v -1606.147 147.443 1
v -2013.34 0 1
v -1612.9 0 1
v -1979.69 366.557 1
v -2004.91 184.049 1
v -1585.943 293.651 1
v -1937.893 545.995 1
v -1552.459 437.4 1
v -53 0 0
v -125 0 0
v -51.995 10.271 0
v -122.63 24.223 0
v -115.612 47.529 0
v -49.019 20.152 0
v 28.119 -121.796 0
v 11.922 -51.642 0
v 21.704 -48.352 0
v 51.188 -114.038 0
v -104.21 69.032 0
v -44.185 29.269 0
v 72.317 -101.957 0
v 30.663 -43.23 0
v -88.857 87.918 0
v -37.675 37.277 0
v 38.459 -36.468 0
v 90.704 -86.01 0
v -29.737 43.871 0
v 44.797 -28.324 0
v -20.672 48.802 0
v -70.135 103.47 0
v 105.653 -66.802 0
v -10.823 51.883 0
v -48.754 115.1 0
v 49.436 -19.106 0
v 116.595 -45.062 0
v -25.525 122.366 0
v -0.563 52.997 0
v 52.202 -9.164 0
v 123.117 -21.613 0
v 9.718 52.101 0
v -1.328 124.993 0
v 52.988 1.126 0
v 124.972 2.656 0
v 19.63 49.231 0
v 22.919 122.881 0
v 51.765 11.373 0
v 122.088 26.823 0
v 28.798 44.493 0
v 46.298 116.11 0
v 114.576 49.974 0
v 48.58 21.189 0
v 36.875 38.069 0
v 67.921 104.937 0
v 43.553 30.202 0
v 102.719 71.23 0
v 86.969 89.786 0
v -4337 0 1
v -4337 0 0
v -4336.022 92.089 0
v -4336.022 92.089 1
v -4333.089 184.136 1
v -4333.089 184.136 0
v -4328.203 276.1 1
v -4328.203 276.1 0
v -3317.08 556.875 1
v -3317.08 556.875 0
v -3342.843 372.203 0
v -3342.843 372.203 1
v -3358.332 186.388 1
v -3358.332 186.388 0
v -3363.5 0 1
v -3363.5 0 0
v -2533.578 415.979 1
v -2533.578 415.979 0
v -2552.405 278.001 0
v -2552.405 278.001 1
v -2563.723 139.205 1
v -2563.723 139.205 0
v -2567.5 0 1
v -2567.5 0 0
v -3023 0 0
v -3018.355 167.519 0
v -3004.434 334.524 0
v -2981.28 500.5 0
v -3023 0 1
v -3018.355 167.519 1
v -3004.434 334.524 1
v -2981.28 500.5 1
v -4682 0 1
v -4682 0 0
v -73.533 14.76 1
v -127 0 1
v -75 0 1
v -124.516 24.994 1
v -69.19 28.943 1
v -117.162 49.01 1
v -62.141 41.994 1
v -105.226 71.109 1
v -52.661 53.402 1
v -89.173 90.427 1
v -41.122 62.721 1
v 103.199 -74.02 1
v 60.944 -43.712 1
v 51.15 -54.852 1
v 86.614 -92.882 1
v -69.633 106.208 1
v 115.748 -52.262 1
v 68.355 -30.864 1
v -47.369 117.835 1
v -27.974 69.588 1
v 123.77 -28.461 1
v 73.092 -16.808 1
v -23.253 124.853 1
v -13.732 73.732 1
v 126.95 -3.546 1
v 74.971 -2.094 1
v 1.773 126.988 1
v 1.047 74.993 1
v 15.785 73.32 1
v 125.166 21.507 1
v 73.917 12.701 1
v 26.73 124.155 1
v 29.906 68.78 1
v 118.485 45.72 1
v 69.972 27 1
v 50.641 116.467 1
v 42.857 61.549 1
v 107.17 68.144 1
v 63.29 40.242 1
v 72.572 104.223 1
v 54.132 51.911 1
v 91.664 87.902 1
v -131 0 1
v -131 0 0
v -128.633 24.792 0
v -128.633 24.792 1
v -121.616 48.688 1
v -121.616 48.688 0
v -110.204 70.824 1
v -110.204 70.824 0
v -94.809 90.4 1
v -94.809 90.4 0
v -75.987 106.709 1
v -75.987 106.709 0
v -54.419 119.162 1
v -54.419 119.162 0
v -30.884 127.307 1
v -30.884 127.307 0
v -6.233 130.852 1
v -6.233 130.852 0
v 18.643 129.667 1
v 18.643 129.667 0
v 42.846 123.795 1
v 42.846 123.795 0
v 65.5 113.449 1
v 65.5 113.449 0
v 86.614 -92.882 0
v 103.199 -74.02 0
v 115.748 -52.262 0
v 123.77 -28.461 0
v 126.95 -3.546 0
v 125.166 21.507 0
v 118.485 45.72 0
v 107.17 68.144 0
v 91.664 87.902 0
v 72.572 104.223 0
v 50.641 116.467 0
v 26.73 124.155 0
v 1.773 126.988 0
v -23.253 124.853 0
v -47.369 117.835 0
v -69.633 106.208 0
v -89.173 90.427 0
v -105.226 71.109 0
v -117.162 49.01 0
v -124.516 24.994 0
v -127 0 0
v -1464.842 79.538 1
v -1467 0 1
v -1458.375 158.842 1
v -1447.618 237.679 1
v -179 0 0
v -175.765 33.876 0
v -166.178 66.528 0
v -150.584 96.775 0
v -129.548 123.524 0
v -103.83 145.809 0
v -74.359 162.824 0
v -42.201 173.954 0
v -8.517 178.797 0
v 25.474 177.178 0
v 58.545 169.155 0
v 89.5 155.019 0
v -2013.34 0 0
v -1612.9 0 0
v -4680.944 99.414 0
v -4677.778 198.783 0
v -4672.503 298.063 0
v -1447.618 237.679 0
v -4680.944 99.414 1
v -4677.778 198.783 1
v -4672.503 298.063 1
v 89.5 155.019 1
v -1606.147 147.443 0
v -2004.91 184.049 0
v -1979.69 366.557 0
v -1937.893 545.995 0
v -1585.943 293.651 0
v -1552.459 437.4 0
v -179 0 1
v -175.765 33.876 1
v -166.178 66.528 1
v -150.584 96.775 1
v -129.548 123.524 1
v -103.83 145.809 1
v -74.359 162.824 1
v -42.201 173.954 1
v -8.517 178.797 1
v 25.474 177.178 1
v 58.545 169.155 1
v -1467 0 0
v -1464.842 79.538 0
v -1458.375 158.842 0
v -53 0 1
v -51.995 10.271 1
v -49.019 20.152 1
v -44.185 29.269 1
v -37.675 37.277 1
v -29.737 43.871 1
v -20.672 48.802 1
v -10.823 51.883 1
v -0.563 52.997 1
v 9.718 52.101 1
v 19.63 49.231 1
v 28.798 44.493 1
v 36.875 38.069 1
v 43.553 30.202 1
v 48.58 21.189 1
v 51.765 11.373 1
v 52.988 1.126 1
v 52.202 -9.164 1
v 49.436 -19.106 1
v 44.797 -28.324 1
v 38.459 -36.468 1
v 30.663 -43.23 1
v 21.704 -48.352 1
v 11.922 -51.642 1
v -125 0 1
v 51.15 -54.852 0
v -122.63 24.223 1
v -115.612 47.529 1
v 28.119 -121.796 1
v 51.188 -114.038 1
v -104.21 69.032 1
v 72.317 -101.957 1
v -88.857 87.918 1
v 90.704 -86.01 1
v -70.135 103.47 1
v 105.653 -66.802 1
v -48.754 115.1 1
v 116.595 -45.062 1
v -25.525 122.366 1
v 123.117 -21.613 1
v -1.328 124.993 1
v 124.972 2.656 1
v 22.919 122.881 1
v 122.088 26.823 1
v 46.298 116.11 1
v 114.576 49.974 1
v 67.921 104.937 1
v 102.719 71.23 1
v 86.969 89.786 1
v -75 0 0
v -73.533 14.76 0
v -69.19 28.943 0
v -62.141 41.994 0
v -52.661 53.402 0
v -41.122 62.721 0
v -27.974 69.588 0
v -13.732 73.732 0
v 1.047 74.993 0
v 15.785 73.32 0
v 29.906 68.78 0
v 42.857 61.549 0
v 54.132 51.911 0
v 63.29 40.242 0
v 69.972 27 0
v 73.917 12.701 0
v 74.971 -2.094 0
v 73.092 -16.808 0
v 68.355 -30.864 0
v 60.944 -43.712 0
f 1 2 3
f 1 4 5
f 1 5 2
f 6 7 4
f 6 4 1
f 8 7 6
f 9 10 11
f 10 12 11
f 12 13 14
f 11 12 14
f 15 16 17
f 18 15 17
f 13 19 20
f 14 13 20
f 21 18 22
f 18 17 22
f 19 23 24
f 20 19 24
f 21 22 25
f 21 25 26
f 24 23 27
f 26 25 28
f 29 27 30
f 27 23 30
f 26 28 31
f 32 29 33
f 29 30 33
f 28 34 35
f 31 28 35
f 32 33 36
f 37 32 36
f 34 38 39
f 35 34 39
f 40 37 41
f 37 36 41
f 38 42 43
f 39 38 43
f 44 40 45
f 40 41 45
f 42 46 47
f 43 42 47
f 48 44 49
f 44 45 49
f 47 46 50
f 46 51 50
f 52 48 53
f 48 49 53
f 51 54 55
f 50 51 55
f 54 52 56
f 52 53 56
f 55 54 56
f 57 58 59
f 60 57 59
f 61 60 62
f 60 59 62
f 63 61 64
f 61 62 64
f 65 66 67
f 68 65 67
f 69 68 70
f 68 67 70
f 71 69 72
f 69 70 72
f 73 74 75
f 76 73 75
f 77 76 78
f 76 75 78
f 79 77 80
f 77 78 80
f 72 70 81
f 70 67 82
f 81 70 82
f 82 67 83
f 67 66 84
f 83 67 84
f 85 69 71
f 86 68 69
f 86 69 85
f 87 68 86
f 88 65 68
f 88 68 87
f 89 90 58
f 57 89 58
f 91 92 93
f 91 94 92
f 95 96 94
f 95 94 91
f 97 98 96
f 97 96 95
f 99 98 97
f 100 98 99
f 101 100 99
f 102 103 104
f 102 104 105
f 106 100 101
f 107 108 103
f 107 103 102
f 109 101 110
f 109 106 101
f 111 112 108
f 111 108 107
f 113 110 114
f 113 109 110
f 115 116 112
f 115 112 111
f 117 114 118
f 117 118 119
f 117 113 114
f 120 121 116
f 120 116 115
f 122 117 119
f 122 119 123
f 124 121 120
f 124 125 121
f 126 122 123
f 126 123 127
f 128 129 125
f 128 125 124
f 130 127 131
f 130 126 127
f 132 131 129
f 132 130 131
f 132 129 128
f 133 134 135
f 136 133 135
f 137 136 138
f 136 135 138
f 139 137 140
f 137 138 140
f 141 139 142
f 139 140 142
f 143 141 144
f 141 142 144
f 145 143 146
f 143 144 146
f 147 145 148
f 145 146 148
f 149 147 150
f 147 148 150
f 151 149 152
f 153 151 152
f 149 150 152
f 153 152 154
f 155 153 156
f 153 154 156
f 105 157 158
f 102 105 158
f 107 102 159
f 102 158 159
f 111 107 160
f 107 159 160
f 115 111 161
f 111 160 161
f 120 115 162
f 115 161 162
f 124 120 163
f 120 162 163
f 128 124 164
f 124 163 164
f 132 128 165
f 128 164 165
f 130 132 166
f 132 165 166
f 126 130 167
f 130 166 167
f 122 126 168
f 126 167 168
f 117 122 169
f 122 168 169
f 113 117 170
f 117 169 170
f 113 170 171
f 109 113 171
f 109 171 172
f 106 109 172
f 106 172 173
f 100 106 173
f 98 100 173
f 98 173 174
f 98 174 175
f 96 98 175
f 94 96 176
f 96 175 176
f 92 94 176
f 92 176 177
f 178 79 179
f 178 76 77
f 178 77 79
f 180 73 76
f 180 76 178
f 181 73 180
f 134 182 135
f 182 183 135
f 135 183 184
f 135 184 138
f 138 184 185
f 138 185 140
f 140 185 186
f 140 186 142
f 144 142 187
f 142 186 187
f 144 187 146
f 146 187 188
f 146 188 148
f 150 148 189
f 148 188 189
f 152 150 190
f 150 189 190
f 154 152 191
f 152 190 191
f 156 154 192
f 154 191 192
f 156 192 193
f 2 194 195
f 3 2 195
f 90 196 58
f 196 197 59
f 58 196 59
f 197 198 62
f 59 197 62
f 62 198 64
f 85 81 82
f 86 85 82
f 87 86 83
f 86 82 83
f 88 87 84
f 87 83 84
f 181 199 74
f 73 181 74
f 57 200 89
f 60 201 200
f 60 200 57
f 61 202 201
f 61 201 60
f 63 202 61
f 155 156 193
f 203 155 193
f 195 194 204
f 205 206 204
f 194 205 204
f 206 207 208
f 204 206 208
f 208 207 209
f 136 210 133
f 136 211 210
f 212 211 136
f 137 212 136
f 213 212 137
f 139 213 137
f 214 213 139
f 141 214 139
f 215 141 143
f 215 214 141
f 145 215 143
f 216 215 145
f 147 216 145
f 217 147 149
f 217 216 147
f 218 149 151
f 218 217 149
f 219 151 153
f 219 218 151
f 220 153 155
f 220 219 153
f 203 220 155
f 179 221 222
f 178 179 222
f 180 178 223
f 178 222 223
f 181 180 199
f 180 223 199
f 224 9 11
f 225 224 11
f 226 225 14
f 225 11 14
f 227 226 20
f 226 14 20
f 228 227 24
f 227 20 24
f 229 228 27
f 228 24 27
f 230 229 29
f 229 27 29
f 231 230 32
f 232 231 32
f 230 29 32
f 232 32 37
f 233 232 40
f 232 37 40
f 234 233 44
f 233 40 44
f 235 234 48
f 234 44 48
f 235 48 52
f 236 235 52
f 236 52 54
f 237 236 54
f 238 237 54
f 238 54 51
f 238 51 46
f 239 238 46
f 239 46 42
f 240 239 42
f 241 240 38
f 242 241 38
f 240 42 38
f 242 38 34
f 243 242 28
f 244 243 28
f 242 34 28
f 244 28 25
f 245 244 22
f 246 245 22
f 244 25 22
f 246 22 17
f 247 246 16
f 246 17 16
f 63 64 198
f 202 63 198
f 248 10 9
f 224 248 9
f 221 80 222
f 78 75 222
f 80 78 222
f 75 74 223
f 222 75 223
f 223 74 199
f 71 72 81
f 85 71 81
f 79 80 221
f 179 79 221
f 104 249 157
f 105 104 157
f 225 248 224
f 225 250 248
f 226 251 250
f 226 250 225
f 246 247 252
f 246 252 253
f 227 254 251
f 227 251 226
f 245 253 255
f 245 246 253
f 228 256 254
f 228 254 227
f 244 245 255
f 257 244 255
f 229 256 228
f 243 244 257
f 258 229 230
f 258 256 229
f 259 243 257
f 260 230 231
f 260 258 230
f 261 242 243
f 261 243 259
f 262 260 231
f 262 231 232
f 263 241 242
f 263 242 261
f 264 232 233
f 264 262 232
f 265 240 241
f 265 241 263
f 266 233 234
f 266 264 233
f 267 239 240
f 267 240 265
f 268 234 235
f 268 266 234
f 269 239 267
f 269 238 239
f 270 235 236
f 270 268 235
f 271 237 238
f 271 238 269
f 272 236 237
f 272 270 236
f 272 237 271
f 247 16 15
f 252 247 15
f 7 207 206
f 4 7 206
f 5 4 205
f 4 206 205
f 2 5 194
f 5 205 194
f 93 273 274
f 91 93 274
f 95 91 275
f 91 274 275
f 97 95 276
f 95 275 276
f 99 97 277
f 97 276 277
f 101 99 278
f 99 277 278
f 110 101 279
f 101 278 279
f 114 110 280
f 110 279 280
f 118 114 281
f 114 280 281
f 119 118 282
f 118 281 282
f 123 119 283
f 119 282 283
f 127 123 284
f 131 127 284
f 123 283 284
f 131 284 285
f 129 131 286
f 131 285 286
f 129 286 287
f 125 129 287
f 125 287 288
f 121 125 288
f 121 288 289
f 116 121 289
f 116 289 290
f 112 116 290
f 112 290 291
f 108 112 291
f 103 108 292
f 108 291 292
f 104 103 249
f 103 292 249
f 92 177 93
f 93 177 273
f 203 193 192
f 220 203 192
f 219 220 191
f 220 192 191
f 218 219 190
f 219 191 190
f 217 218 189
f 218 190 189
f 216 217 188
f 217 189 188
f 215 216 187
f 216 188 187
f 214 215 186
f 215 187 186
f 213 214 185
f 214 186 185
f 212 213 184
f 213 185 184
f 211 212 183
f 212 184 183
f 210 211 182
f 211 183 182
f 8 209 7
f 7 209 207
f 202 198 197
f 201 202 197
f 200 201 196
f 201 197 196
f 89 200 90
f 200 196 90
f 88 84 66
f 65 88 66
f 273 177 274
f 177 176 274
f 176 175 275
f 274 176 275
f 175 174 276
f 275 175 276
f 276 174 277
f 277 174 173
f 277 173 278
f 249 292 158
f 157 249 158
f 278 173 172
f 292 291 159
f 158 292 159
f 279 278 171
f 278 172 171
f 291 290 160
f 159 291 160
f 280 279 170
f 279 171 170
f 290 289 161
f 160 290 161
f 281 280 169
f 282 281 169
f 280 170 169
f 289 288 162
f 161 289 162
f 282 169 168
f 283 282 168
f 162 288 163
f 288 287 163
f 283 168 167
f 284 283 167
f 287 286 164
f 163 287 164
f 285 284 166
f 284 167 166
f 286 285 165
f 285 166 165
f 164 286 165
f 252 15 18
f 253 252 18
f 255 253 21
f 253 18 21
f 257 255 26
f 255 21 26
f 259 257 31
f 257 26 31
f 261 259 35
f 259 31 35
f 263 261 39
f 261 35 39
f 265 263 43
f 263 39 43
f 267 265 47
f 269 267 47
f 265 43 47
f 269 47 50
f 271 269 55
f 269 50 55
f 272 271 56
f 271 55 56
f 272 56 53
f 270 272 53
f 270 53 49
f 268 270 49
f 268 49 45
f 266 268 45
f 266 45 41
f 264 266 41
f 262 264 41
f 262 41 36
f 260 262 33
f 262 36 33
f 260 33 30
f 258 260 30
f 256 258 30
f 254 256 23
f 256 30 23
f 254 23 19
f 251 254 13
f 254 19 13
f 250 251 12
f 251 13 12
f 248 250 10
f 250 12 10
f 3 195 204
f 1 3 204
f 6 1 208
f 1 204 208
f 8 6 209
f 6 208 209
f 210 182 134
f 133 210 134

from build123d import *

# Parameters (mm, degrees)
F6_DEPTH = 1
F8_DEPTH = 1


# Not quite as in the source:
# - a feature names something its author has since deleted; it is built from what else it names


with BuildPart() as f6:
    # F0 (on Top) → F6 (new body)
    with BuildSketch(Plane.XY):
        with BuildLine():
            Line((-179, 0), (-131, 0))
            ThreePointArc((-131, 0), (-65.5, 113.4493278958), (65.5, 113.4493278958))
            Line((65.5, 113.4493278958), (89.5, 155.0185472774))
            ThreePointArc((89.5, 155.0185472774), (-89.5, 155.0185472774), (-179, 0))
        make_face()
    extrude(amount=F6_DEPTH)


with BuildPart() as f6b:
    # F2 (on Top) → F6, piece 2 (new body)
    with BuildSketch(Plane.XY):
        with BuildLine():
            Line((-127, 0), (-75, 0))
            ThreePointArc((-75, 0), (29.9061801694, 68.7795055789), (51.1498770047, -54.8515276214))
            Line((51.1498770047, -54.8515276214), (86.6137917279, -92.8819201056))
            ThreePointArc((86.6137917279, -92.8819201056), (50.6411317535, 116.4666294469), (-127, 0))
        make_face()
    extrude(amount=F6_DEPTH)


with BuildPart() as f6c:
    # F4 (on Top) → F6, piece 3 (new body)
    with BuildSketch(Plane.XY):
        with BuildLine():
            Line((-125, 0), (-53, 0))
            ThreePointArc((-53, 0), (32.9932757418, 41.4782323132), (11.9224058802, -51.6416134336))
            Line((11.9224058802, -51.6416134336), (28.118881793, -121.7962580982))
            ThreePointArc((28.118881793, -121.7962580982), (77.8143295797, 97.8260196066), (-125, 0))
        make_face()
    extrude(amount=F6_DEPTH)


with BuildPart() as f6d:
    # F5 (on Top) → F6, piece 4 (new body)
    with BuildSketch(Plane.XY):
        with BuildLine():
            Line((-2567.5, 0), (-1467, 0))
            ThreePointArc((-1467, 0), (-1462.1464470723, 119.2340862083), (-1447.6179041391, 237.6792031622))
            Line((-1447.6179041391, 237.6792031622), (-2533.5780292278, 415.9791098288))
            ThreePointArc((-2533.5780292278, 415.9791098288), (-2559.0054552543, 208.6799702385), (-2567.5, 0))
        make_face()
    extrude(amount=F6_DEPTH)


with BuildPart() as f6e:
    # F3 (on Top) → F6, piece 5 (new body)
    with BuildSketch(Plane.XY):
        with BuildLine():
            Line((-3363.5, 0), (-3023, 0))
            ThreePointArc((-3023, 0), (-3012.5518747764, 251.1179041426), (-2981.2797209521, 500.4999754646))
            Line((-2981.2797209521, 500.4999754646), (-3317.0804966663, 556.8745178548))
            ThreePointArc((-3317.0804966663, 556.8745178548), (-3351.8750350018, 279.4029343644), (-3363.5, 0))
        make_face()
    extrude(amount=F6_DEPTH)


with BuildPart() as f6f:
    # F1 (on Top) → F6, piece 6 (new body)
    with BuildSketch(Plane.XY):
        with BuildLine():
            Line((-4682, 0), (-4337, 0))
            ThreePointArc((-4337, 0), (-4334.80009878, 138.1198885634), (-4328.2026268772, 276.0996571768))
            Line((-4328.2026268772, 276.0996571768), (-4672.5028127828, 298.0628533322))
            ThreePointArc((-4672.5028127828, 298.0628533322), (-4679.6251008734, 149.1070597772), (-4682, 0))
        make_face()
    extrude(amount=F6_DEPTH)


with BuildPart() as f8:
    # F7 (on Top) → F8 (new body)
    with BuildSketch(Plane.XY):
        with BuildLine():
            Line((-2013.34, 0), (-1612.9, 0))
            ThreePointArc((-1612.9, 0), (-1597.718202671, 220.7780669673), (-1552.4586150985, 437.3998838665))
            Line((-1552.4586150985, 437.3998838665), (-1937.8926332212, 545.9945949431))
            ThreePointArc((-1937.8926332212, 545.9945949431), (-1994.3889678006, 275.5913654584), (-2013.34, 0))
        make_face()
    extrude(amount=F8_DEPTH)


solid = Compound([f6.part, f6b.part, f6c.part, f6d.part, f6e.part, f6f.part, f8.part])
